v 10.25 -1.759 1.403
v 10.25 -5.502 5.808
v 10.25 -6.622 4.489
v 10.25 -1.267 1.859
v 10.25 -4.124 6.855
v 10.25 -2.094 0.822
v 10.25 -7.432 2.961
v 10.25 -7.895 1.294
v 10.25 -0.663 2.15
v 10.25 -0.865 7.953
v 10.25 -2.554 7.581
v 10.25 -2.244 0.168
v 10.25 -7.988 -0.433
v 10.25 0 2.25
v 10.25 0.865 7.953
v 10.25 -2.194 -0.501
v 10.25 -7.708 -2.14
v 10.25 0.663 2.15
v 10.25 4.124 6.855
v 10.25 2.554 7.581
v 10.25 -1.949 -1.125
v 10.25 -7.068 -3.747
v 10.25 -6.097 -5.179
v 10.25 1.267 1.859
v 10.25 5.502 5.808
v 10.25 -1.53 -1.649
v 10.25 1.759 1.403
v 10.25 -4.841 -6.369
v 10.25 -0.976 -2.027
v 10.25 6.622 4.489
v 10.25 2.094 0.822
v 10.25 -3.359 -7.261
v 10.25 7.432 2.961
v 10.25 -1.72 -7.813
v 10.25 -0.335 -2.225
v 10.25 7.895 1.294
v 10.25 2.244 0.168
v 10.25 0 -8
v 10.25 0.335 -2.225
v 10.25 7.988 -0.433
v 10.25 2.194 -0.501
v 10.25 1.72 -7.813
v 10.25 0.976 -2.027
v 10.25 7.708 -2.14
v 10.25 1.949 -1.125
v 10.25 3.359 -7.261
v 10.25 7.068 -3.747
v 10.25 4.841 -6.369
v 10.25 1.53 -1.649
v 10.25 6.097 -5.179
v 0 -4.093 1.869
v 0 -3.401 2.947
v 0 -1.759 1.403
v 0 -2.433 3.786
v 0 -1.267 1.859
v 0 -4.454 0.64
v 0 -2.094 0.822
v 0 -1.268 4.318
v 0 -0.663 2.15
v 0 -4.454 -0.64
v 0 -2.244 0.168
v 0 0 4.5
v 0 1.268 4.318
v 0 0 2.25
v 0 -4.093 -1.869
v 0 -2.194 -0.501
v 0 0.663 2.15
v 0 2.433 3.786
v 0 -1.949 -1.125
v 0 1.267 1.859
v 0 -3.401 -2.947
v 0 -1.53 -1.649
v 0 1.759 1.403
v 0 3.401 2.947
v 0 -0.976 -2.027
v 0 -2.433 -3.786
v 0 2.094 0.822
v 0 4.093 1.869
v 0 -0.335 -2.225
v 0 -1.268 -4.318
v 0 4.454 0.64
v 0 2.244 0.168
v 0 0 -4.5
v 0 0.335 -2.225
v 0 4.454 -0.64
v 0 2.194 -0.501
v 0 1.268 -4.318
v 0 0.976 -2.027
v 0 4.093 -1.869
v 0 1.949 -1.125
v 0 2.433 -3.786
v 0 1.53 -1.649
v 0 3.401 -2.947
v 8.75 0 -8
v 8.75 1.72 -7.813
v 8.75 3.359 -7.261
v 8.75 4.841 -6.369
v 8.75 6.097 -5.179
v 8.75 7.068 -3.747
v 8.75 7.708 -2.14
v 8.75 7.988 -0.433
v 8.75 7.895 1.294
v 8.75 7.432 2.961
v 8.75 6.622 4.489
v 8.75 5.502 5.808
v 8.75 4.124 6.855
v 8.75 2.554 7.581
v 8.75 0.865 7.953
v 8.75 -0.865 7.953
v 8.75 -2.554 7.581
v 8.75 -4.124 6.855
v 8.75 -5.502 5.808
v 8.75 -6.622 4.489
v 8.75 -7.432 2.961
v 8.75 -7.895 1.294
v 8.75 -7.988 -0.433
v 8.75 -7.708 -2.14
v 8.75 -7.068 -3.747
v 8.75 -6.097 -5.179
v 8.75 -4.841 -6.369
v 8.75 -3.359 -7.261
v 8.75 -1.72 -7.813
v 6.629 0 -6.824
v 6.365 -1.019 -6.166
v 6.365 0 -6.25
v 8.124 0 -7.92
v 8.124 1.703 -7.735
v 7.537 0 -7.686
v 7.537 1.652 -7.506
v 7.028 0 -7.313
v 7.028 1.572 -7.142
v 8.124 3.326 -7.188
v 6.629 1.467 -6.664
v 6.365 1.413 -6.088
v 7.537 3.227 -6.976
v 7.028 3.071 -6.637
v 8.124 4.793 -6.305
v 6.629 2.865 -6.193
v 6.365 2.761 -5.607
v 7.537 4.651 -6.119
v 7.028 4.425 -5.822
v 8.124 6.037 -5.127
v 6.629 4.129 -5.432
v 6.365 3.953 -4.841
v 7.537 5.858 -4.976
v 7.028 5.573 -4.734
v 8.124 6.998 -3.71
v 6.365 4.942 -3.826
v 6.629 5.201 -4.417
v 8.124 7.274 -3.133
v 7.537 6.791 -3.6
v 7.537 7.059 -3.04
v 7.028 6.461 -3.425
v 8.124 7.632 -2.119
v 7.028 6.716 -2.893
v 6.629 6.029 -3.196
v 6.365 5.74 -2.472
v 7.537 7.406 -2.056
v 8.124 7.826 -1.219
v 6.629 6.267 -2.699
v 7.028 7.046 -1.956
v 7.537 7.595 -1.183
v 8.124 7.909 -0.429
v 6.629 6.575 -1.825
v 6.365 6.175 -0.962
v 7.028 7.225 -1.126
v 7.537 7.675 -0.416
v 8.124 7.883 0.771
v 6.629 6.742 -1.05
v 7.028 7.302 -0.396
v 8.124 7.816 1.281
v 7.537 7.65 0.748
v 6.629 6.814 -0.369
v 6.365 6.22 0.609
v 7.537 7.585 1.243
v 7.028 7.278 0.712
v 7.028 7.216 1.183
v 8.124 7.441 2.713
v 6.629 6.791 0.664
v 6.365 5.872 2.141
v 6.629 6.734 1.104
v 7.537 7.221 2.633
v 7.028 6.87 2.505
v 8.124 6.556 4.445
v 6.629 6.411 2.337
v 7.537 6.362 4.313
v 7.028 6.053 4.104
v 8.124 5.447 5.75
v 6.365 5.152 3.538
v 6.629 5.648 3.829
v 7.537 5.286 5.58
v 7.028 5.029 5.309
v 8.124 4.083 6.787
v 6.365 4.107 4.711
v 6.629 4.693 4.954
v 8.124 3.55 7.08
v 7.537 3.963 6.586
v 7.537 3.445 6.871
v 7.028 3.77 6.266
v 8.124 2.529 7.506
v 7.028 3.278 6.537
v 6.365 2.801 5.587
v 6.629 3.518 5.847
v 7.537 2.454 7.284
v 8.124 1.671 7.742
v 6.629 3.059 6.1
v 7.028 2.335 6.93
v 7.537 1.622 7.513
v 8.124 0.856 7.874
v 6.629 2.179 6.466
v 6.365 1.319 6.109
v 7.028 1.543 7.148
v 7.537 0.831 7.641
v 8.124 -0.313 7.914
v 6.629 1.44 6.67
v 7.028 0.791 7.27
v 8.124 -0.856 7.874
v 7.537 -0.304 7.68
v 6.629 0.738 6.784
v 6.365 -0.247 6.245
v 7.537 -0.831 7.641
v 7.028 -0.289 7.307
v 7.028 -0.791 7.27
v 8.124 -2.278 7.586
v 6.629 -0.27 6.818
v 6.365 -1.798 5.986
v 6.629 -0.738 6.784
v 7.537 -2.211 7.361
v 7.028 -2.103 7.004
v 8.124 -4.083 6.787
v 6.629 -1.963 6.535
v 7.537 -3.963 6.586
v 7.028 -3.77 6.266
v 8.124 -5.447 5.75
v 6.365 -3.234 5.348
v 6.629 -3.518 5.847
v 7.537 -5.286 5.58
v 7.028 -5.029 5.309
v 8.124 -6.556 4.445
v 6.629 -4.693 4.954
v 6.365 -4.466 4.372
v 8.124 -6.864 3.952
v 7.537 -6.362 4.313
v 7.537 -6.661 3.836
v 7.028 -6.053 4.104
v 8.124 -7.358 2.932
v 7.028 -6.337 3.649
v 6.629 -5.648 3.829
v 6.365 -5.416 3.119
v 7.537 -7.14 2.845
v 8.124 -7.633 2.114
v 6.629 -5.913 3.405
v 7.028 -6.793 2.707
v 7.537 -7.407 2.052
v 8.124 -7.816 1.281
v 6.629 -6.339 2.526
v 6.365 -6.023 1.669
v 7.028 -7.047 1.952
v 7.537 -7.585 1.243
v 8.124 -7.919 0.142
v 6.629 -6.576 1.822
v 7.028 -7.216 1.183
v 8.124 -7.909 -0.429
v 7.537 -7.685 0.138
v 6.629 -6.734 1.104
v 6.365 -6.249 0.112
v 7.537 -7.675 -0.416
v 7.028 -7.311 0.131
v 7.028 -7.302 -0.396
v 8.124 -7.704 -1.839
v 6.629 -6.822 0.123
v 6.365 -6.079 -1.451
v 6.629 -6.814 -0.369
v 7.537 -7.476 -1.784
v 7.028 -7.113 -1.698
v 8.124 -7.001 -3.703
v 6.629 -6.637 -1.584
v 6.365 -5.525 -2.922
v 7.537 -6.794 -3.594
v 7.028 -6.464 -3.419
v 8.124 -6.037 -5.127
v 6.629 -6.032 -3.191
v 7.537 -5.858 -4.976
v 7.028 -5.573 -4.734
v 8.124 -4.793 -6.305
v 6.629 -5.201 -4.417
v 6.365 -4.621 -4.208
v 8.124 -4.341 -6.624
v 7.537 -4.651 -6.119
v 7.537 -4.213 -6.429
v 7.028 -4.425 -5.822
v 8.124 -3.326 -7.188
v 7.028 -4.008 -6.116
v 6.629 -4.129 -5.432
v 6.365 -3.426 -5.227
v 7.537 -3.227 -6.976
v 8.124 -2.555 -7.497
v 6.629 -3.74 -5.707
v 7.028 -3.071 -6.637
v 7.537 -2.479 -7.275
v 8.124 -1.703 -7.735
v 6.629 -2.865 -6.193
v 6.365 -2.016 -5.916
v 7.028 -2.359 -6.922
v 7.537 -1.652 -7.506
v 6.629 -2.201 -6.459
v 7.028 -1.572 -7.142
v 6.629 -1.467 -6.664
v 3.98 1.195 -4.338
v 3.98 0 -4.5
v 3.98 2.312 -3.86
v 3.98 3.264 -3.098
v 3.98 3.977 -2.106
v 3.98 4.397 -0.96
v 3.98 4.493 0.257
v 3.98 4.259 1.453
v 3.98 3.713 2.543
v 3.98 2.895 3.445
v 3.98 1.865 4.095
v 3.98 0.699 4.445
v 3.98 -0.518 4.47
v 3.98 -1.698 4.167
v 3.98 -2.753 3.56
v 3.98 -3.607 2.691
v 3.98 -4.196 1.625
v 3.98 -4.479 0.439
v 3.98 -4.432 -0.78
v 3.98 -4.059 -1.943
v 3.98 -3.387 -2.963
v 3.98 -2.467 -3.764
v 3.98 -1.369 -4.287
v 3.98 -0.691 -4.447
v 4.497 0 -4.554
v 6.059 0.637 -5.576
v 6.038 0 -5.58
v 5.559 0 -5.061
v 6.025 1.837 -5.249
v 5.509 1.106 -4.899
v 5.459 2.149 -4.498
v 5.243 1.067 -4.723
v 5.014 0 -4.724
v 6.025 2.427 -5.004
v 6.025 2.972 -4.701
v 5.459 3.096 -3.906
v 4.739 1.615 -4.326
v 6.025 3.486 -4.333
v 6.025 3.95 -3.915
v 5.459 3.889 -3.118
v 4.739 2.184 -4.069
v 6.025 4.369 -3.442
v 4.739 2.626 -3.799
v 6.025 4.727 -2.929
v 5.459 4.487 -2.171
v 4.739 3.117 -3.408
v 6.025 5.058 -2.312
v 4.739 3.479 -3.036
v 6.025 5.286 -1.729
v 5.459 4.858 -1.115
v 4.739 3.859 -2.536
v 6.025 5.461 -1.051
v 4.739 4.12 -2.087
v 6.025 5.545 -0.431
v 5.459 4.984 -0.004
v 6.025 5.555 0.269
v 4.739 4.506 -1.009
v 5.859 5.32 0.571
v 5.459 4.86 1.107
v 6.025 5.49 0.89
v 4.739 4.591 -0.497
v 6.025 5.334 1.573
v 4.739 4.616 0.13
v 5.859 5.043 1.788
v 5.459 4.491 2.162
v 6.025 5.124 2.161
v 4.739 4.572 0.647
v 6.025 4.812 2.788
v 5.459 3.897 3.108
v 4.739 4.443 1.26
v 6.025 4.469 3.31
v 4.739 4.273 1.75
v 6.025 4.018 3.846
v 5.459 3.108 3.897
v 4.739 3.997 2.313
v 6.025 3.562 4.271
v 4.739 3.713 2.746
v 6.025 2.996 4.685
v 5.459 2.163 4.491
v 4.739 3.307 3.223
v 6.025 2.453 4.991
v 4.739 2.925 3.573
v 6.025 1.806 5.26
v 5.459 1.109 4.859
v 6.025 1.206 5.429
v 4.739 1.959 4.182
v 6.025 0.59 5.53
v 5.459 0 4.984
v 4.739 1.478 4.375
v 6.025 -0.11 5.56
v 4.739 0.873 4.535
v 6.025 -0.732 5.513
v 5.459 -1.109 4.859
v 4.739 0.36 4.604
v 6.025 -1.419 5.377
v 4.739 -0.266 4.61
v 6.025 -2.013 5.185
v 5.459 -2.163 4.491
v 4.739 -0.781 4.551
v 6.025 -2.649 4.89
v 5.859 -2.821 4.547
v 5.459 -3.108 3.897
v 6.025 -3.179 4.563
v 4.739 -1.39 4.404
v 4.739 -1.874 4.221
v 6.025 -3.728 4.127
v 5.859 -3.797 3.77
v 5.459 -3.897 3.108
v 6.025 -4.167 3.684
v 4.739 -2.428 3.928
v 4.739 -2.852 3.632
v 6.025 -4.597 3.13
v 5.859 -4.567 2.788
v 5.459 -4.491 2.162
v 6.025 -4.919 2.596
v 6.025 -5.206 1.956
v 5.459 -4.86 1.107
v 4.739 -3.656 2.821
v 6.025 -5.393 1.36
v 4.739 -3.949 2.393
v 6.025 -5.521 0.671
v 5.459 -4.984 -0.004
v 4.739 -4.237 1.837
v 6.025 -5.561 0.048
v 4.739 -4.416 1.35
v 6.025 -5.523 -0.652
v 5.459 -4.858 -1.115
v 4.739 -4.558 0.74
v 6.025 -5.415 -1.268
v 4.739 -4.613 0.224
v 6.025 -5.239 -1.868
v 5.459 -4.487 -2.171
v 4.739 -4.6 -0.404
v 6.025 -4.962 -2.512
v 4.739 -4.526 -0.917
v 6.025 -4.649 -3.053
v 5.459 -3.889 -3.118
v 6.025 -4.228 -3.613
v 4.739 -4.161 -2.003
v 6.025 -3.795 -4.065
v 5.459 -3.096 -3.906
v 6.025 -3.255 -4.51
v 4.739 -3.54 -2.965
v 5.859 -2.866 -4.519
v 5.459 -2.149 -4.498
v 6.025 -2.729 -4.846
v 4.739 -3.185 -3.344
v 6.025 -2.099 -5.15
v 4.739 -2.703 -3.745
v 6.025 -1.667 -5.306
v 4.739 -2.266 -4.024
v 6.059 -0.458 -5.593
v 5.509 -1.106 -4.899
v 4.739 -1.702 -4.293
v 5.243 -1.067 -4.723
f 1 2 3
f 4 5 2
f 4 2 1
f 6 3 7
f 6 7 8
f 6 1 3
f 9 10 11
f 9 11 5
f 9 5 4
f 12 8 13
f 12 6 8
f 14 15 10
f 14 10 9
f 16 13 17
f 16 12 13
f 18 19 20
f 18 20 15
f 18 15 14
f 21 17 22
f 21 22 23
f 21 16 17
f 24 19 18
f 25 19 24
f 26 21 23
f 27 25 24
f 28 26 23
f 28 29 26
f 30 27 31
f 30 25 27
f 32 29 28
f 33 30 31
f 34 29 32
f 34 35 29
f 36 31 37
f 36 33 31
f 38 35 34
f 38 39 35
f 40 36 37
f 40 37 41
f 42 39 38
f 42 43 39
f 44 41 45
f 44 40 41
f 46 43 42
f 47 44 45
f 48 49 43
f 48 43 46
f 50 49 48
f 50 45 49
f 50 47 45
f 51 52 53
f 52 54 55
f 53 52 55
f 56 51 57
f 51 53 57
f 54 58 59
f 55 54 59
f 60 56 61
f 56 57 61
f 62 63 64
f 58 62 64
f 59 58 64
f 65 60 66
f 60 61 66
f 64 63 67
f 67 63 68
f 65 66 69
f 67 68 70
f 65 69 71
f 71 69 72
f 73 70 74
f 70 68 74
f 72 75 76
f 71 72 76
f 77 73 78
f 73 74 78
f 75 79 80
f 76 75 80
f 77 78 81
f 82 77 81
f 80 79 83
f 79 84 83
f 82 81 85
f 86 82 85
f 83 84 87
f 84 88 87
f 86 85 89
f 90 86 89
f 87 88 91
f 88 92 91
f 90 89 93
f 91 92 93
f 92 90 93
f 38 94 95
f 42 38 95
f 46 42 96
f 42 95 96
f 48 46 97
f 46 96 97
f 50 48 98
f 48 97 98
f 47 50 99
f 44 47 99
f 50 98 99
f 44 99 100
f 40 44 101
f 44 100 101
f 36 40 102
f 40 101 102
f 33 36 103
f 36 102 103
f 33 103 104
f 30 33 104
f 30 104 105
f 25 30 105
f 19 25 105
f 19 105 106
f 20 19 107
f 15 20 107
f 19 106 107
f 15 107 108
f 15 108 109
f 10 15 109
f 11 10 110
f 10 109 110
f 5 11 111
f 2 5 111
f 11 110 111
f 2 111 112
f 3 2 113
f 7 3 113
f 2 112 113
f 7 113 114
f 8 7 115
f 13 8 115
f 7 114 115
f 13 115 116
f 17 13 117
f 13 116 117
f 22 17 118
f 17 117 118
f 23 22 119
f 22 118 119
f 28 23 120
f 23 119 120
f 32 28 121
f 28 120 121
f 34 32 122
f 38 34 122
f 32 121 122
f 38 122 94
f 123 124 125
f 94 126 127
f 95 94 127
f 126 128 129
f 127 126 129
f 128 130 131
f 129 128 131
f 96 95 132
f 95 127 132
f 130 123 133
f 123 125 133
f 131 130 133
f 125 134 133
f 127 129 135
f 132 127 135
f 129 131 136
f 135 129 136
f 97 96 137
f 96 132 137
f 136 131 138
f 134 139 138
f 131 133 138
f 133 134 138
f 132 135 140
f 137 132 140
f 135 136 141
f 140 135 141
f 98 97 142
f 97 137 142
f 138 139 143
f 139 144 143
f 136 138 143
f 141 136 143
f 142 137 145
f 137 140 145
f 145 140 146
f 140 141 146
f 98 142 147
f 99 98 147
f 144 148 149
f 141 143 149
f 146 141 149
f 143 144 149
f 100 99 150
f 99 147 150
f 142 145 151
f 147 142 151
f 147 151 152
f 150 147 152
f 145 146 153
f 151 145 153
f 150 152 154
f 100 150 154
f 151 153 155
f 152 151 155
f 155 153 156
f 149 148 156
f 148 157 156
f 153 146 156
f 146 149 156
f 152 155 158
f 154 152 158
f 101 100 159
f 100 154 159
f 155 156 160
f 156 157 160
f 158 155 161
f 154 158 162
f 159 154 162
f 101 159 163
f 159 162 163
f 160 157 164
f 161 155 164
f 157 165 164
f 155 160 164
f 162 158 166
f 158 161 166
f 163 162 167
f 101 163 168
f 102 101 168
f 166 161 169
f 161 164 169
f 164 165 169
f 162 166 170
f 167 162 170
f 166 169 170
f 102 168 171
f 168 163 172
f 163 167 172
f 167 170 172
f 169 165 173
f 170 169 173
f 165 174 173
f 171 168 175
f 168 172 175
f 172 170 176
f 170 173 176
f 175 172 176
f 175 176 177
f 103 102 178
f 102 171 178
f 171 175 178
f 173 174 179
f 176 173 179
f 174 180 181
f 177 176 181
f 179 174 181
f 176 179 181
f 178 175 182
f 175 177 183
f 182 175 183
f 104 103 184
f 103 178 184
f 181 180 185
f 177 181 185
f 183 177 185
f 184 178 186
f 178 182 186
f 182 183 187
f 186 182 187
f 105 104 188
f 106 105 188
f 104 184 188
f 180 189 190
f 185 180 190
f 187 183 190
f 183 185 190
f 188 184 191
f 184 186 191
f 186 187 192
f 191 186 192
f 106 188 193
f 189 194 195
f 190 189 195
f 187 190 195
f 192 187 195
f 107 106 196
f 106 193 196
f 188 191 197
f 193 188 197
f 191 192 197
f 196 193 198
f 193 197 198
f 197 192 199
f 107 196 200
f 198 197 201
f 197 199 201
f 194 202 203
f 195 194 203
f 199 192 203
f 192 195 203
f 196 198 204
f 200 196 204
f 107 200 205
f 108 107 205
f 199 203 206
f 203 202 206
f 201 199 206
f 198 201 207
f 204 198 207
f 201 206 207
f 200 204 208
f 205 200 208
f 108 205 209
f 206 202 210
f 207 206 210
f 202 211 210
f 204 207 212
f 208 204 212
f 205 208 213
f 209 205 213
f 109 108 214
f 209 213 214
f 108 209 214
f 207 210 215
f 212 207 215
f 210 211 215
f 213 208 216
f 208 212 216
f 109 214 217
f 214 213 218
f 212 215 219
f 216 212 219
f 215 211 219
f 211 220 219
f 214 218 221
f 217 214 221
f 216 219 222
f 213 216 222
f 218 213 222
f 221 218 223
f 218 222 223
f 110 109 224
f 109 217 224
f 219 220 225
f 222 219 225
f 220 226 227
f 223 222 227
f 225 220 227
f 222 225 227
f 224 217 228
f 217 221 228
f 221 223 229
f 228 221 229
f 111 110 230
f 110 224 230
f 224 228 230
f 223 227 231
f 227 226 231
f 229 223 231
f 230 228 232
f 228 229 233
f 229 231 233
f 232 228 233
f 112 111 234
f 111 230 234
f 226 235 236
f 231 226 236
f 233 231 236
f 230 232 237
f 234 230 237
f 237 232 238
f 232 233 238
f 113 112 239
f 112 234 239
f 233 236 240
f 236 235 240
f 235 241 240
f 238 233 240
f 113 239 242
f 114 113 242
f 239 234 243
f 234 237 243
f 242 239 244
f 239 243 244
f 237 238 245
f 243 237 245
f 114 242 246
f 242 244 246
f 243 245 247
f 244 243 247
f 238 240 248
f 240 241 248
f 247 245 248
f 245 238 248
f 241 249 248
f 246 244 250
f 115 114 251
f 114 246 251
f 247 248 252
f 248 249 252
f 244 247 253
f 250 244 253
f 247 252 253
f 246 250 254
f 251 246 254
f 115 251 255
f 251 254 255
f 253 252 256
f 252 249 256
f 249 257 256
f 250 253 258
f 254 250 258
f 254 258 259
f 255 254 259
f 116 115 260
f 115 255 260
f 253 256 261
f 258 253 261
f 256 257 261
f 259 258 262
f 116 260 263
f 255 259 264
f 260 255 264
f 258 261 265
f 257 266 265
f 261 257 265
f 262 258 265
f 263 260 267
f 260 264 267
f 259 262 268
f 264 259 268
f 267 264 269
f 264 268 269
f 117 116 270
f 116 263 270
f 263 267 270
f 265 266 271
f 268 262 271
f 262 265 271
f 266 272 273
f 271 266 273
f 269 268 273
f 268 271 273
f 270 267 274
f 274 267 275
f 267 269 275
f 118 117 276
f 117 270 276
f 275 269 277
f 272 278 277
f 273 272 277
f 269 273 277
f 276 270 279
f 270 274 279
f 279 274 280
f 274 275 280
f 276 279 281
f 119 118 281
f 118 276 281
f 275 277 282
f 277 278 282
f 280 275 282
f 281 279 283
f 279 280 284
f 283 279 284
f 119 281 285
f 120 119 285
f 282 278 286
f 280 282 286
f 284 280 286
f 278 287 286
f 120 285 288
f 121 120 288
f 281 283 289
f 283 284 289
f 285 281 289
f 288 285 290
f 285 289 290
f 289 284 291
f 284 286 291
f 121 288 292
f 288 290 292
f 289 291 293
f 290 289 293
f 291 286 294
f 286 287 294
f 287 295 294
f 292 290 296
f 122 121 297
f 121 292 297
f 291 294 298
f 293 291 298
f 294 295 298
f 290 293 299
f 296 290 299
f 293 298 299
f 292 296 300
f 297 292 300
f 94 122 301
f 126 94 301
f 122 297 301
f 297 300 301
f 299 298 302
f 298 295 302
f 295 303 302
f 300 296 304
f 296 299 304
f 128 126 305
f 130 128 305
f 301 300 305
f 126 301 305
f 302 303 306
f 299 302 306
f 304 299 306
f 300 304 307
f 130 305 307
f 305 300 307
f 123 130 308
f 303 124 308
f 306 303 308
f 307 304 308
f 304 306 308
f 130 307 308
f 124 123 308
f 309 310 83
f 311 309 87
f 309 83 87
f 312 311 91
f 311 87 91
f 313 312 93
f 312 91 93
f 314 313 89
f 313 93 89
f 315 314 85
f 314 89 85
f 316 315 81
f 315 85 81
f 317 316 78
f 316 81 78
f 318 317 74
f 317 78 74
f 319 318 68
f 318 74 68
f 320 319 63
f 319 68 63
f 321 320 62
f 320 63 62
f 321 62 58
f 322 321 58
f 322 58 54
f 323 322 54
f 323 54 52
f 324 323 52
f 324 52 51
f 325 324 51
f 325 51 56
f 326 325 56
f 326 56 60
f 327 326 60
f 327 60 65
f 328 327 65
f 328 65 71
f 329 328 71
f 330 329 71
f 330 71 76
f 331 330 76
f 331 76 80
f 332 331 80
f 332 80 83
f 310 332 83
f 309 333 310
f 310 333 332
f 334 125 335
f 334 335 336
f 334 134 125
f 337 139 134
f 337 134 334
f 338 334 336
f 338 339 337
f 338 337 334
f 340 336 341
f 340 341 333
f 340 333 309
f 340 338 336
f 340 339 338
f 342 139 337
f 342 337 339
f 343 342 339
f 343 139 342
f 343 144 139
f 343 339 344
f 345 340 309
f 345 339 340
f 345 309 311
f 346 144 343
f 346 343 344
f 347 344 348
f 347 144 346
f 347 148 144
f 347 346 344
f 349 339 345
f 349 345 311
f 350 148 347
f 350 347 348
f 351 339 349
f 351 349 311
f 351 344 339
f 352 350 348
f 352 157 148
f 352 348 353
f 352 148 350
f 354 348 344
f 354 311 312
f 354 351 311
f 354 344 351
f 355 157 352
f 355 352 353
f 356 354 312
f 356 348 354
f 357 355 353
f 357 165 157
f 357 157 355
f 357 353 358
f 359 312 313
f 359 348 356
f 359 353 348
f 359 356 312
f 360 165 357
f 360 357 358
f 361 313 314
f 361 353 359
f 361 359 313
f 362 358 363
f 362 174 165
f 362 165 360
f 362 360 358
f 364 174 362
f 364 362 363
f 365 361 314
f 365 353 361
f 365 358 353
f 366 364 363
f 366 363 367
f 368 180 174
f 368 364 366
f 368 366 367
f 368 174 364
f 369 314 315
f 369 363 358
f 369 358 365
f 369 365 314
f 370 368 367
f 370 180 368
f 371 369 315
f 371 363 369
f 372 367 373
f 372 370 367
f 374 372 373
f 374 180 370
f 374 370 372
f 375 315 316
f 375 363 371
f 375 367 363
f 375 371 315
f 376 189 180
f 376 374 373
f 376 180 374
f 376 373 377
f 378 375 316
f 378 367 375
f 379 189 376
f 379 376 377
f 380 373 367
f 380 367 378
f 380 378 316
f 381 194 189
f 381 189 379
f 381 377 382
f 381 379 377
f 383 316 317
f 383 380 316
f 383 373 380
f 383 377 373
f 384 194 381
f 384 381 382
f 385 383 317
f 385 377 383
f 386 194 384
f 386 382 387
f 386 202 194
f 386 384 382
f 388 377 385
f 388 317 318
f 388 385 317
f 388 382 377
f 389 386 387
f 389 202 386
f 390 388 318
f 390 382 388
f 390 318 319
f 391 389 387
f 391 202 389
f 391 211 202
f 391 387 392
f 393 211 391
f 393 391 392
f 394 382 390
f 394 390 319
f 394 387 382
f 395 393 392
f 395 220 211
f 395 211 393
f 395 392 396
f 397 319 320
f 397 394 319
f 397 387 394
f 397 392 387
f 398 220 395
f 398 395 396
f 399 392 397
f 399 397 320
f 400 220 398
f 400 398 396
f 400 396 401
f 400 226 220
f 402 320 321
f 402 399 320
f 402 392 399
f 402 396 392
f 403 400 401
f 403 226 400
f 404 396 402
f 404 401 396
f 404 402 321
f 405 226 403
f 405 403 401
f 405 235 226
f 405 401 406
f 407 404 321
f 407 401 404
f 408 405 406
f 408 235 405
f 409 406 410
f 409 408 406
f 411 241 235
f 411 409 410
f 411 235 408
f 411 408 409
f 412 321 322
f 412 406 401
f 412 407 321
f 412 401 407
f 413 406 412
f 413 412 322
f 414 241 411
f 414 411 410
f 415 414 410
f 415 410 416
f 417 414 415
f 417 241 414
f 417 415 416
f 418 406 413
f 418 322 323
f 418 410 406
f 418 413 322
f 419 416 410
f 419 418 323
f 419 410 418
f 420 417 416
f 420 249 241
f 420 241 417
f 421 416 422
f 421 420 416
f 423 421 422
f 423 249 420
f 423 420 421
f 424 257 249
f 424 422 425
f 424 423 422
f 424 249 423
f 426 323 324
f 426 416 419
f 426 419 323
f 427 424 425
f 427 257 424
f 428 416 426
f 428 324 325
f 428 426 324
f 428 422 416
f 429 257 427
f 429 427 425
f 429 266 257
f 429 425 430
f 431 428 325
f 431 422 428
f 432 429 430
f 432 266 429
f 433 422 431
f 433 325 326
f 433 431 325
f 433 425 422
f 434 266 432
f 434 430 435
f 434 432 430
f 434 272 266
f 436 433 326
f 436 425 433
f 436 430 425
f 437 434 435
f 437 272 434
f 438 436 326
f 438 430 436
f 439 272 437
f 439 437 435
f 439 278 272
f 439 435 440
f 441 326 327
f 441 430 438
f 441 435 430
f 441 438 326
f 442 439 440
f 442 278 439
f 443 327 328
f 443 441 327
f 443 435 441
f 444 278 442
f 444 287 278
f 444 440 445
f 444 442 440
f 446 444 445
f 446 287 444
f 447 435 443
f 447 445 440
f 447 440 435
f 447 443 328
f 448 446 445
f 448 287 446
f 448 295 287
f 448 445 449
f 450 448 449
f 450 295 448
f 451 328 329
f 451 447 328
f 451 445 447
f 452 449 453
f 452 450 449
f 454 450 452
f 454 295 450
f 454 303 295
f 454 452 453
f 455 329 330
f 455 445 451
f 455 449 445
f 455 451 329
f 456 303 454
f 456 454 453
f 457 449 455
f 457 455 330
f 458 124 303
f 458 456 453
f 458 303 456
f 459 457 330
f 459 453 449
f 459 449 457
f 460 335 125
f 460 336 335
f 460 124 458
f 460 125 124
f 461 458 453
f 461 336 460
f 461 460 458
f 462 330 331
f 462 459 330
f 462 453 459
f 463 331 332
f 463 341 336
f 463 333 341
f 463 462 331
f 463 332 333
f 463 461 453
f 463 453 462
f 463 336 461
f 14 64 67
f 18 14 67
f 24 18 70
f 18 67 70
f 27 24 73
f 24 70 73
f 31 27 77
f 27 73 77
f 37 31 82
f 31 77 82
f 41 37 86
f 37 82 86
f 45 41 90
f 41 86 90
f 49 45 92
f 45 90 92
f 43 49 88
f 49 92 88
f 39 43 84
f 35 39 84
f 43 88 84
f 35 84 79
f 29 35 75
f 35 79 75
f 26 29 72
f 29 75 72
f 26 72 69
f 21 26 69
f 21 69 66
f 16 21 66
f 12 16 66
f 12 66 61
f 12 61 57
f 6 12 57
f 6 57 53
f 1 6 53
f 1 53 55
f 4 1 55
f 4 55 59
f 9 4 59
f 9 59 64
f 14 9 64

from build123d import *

# Parameters (mm, degrees)
SKETCH1_R           = 4.5
BOSS_EXTRUDE1_DEPTH = 10.25
SKETCH3_R           = 2.250000008
CUT_EXTRUDE1_DEPTH  = 34
BOSS_EXTRUDE2_START = -4
SKETCH4_R           = 8
SKETCH4_R_2         = 4.5
BOSS_EXTRUDE2_DEPTH = 4
FILLET1_R           = 2.5
FILLET2_R           = 2.5


with BuildPart() as part:
    # Sketch1 → Boss-Extrude1 (new body)
    with BuildSketch(Plane(origin=(0, 0, 0), x_dir=(0, 0, -1), z_dir=(1, 0, 0))):
        Circle(SKETCH1_R)
    extrude(amount=BOSS_EXTRUDE1_DEPTH)

    # Sketch3 → Cut-Extrude1 (cut)
    with BuildSketch(Plane.ZY):
        Circle(SKETCH3_R)
    extrude(amount=-CUT_EXTRUDE1_DEPTH, mode=Mode.SUBTRACT)

    # Sketch4 → Boss-Extrude2 (add)
    with BuildSketch(Plane(origin=(10.25, 0, 0), x_dir=(0, 0, -1), z_dir=(1, 0, 0)).offset(BOSS_EXTRUDE2_START)):
        Circle(SKETCH4_R)
        Circle(SKETCH4_R_2, mode=Mode.SUBTRACT)
    extrude(amount=BOSS_EXTRUDE2_DEPTH)

    # Fillet1
    fillet1_edges = [part.edges().sort_by_distance(p)[0] for p in [
        (6.25, 0, 8),
    ]]
    fillet(fillet1_edges, radius=FILLET1_R)

    # Fillet2
    fillet2_edges = [part.edges().sort_by_distance(p)[0] for p in [
        (6.25, 0, 4.5),
    ]]
    fillet(fillet2_edges, radius=FILLET2_R)


solid = part.part
